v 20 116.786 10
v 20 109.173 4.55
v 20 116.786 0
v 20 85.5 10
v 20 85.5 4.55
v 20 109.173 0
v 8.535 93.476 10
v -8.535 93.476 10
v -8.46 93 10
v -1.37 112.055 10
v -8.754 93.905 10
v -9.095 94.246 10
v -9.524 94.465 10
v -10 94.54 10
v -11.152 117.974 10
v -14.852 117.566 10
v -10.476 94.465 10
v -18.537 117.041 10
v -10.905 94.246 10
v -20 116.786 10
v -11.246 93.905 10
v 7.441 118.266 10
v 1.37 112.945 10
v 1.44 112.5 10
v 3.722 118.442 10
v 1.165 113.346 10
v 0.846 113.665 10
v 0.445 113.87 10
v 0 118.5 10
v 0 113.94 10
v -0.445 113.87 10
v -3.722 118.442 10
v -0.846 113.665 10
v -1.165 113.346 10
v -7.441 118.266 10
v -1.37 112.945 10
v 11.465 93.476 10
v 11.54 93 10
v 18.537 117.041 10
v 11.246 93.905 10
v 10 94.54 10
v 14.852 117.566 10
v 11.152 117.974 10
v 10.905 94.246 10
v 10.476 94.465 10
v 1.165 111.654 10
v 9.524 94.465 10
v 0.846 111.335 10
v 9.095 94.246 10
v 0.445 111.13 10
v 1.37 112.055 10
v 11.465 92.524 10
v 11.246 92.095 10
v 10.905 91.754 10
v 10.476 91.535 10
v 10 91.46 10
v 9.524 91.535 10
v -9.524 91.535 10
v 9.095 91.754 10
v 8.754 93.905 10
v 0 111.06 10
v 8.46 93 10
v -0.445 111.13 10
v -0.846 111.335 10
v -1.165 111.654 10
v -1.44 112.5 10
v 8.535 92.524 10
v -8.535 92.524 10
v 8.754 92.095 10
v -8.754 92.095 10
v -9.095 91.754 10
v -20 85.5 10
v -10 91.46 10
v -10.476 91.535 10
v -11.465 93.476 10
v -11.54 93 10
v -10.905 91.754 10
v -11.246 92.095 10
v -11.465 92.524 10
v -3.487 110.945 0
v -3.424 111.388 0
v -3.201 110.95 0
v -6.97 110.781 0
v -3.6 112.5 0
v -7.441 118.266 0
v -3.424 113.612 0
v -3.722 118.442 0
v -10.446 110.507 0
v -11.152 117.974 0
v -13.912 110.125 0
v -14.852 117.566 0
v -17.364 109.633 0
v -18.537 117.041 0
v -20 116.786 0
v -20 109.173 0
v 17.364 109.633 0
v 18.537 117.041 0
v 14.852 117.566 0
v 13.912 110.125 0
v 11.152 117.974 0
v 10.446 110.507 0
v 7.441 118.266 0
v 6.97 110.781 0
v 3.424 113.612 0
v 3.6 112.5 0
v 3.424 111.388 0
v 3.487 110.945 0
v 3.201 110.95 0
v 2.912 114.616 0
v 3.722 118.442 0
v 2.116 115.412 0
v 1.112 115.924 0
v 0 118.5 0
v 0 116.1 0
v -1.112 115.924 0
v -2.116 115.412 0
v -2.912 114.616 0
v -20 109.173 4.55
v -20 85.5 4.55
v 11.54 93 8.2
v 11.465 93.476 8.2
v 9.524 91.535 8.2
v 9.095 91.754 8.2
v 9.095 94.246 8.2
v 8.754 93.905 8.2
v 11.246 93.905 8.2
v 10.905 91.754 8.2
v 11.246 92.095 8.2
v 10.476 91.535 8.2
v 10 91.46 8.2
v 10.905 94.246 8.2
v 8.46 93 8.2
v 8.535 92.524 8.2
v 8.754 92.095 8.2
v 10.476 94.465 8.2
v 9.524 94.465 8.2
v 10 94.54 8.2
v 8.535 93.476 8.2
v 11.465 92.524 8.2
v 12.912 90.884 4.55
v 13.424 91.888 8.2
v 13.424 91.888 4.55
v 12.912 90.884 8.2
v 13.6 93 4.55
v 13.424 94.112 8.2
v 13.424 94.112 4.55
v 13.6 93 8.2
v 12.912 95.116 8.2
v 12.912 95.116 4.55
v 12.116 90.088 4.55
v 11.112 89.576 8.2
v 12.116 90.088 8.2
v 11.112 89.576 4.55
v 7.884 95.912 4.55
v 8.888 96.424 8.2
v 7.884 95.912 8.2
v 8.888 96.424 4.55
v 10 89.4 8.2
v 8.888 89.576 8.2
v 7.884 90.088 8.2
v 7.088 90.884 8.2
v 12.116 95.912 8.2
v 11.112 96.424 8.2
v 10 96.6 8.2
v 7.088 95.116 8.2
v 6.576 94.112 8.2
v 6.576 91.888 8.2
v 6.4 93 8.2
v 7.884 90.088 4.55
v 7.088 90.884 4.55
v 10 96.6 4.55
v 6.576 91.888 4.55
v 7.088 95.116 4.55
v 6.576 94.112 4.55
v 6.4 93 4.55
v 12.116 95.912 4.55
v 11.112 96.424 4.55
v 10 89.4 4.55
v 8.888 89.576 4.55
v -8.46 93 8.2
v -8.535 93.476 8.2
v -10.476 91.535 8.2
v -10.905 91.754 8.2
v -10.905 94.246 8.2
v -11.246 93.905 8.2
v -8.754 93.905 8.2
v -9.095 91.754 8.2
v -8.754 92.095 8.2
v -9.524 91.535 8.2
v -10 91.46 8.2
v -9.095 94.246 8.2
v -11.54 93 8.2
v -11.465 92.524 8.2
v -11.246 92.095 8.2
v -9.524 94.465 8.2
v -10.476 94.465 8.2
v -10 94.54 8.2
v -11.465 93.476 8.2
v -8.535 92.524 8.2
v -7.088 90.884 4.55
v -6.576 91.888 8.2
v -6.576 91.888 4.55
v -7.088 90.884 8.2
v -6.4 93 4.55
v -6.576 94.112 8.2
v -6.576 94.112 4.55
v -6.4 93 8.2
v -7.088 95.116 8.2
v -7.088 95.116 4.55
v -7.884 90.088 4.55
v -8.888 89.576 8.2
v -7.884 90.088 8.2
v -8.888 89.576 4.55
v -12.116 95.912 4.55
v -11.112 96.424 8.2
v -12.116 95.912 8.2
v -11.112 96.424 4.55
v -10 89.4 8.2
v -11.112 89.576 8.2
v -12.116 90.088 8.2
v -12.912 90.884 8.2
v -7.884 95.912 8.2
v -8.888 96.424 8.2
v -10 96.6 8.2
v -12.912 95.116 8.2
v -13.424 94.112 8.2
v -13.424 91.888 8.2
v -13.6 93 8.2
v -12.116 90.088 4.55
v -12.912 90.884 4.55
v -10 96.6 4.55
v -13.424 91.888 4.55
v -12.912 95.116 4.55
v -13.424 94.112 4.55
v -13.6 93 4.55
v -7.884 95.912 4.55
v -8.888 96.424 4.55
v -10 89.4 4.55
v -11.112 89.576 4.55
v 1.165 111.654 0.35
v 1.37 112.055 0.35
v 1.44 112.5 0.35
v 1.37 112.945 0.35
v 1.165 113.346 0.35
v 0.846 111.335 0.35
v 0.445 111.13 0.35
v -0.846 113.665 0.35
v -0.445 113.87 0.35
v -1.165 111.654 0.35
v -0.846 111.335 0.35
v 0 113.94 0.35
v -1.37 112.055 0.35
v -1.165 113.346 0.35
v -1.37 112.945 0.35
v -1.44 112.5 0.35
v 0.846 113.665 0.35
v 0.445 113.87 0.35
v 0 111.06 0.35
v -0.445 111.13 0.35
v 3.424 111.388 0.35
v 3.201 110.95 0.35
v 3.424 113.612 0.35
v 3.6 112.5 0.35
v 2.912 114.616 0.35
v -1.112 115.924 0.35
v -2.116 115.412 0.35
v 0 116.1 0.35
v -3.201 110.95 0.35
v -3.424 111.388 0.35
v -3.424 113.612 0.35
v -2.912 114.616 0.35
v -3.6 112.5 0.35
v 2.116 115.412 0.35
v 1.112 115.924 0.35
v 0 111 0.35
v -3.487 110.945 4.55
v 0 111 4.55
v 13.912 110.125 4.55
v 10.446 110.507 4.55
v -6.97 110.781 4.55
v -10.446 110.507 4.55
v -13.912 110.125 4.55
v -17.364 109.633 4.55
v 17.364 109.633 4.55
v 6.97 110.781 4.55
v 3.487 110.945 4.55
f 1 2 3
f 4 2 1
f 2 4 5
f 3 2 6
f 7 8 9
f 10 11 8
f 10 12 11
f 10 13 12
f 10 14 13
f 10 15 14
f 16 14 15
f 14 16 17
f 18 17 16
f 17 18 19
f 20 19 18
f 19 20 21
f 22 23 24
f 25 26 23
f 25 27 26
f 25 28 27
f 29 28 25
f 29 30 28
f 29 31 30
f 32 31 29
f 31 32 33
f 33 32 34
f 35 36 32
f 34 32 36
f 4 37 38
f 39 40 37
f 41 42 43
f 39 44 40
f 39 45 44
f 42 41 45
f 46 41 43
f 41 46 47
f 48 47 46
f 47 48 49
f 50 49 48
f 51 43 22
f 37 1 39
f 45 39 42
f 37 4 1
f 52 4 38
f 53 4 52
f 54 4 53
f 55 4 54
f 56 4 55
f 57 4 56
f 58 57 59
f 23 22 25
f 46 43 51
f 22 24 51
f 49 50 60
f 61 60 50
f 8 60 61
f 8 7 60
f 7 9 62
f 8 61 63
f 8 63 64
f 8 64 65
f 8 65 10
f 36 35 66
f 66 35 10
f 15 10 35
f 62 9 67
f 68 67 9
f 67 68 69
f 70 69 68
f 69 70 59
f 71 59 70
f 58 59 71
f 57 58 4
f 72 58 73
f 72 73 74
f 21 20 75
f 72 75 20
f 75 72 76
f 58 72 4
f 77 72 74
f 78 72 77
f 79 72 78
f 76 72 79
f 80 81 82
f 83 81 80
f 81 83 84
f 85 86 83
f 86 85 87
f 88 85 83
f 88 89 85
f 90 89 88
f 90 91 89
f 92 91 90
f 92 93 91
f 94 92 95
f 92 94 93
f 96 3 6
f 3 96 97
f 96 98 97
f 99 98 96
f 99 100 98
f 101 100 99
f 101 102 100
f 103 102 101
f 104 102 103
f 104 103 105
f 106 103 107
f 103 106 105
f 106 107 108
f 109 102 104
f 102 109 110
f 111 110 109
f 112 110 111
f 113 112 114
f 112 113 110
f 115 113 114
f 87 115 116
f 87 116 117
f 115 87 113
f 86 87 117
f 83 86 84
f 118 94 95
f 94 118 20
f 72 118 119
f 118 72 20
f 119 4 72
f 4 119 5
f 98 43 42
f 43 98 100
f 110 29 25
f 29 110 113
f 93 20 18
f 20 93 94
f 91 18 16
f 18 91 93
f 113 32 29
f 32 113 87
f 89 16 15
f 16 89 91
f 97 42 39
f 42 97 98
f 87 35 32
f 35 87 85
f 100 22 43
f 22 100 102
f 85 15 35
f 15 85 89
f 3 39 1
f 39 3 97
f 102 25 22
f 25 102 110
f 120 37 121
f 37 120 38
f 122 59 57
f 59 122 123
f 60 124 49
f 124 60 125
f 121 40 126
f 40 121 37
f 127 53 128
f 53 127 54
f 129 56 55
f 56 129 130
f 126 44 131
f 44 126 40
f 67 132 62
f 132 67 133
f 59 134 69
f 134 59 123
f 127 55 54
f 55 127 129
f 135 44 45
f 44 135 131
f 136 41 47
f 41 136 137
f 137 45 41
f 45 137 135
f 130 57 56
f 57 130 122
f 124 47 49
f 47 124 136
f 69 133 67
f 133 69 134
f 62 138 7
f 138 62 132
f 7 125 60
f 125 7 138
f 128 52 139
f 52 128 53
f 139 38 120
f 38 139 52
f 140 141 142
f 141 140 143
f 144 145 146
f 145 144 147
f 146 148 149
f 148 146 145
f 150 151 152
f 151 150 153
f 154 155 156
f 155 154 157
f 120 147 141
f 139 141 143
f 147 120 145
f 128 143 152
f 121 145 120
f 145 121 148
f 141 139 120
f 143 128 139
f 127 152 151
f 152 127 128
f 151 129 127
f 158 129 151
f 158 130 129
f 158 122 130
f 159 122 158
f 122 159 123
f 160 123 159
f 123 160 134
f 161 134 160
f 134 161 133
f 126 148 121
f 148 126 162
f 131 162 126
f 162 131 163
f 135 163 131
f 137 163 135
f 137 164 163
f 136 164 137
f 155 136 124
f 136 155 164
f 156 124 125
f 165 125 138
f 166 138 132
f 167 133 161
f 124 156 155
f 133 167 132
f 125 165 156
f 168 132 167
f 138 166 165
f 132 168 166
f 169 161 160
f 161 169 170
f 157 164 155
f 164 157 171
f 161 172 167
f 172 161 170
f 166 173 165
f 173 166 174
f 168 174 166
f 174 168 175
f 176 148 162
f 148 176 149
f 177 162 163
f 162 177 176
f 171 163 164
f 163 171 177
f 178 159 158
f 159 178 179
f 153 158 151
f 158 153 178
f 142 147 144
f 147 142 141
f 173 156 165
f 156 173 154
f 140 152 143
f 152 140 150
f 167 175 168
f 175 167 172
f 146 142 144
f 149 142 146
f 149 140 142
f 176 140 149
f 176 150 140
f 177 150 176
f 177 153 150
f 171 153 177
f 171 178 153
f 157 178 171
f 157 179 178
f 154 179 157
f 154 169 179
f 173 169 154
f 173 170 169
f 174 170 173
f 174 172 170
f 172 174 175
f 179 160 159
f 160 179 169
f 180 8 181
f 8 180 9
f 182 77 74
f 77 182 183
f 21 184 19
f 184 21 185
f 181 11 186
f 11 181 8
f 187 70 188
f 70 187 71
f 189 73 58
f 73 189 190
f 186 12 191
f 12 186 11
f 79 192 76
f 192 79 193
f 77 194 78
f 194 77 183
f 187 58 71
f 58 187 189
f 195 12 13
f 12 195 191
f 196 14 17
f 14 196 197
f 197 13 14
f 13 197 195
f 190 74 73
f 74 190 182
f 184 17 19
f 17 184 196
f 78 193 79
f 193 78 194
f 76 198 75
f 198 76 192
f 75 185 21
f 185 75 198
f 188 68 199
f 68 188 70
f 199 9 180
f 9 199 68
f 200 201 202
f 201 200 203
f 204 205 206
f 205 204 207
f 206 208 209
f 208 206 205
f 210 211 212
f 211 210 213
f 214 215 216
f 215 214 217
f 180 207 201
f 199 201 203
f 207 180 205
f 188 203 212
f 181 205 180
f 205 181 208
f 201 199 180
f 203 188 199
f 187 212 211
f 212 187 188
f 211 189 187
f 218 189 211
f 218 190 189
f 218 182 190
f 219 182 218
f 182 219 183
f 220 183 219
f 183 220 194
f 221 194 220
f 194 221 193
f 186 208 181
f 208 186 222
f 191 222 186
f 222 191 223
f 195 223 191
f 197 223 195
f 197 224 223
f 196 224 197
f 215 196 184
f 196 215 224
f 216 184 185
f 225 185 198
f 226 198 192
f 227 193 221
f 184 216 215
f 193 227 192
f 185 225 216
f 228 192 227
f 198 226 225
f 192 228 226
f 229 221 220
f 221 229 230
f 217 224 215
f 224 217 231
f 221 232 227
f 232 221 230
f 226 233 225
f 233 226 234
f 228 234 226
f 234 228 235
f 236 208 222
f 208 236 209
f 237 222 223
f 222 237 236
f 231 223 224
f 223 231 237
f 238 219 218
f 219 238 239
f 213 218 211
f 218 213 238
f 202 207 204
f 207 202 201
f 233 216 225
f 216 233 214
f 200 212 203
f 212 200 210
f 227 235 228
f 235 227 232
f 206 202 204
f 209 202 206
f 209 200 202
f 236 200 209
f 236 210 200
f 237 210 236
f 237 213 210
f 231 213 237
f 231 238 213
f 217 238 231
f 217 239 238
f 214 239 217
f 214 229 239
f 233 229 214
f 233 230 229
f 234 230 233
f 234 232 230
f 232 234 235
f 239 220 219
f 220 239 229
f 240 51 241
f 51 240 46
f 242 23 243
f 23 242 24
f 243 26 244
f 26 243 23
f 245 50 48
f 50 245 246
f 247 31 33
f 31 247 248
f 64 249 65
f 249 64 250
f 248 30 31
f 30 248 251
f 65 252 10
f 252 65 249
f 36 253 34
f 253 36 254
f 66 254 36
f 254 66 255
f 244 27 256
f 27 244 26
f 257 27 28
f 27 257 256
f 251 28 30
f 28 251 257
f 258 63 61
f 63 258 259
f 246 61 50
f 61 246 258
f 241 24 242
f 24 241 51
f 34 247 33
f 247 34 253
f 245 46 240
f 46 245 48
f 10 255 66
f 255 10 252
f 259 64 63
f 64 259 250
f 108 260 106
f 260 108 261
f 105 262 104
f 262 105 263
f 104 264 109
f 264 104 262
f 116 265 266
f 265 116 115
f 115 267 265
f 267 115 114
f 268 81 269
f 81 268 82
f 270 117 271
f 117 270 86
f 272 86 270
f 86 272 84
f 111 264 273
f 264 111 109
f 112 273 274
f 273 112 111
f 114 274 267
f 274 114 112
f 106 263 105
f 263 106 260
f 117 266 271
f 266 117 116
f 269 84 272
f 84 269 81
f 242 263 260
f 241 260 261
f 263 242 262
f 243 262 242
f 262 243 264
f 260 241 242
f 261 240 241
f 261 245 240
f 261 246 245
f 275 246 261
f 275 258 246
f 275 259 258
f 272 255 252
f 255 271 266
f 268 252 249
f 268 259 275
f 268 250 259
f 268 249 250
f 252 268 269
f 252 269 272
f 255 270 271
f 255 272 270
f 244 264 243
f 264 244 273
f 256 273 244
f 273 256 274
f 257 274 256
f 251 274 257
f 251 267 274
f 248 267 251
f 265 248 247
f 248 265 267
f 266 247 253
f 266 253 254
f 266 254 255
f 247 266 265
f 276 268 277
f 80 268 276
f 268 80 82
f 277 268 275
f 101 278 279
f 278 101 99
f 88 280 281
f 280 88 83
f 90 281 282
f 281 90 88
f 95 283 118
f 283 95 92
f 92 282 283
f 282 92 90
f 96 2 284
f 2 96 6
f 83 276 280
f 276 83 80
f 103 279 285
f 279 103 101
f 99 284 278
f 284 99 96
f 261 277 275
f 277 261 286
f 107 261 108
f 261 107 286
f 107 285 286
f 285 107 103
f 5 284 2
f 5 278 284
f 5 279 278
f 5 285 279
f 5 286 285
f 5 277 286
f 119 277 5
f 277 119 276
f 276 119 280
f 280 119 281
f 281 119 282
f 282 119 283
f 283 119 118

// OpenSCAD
// file: configuration.scad
// Increase this if your slicer or printer make holes too tight.
extra_radius = 0.1;

// OD = outside diameter, corner to corner.
m3_nut_od = 6.1;
m3_nut_radius = m3_nut_od/2 + 0.2 + extra_radius;
m3_washer_radius = 3.5 + extra_radius;
m3_washer_height = 0.65;

// Major diameter of metric 3mm thread.
m3_head_height = 3;
m3_major = 2.88;
m3_radius = m3_major/2 + extra_radius;
m3_wide_radius = m3_major/2 + extra_radius + 0.2;

// NEMA17 stepper motors.
motor_shaft_diameter = 5;
motor_shaft_radius = motor_shaft_diameter/2 + extra_radius;

// Frame brackets. M3x8mm screws work best with 3.6 mm brackets.
thickness = 3.6;

// OpenBeam or Misumi. Currently only 15x15 mm, but there is a plan
// to make models more parametric and allow 20x20 mm in the future.
extrusion = 15;

// Placement for the NEMA17 stepper motors.
motor_offset = 44;
motor_length = 47;
// main file
include <configuration.scad>;

mount_height = 10.0;
lip_thickness = 15.0;
extrusion_triangle_ext = 56.0;
expansion_gap = 1.0;

module M3Screw()
{
	union()
	{
		// Main shaft
		translate([0, 0, m3_head_height])
		cylinder(r=m3_radius, h=mount_height+1, $fn=20);
		// Head
		cylinder(r=m3_washer_radius, h=m3_head_height+m3_washer_height, $fn=20);
	}
}

module M3ExactScrew()
{
	union()
	{
		// Main shaft
		translate([0, 0, m3_head_height])
		cylinder(r=m3_radius - extra_radius, h=mount_height+1, $fn=20);
		// Head
		cylinder(r=m3_washer_radius, h=m3_head_height+m3_washer_height, $fn=20);
	}
}

module BuildSurfaceMount(
	build_surface_radius = 110,
	build_surface_height = 3.25,
	pad_height = 2.3,
	width = 40,
	height = 10,
	extrusion_width = 15,
	extrusion_length = 240)
{
	//build_center = sqrt((pow(extrusion_length + extrusion_triangle_ext*2,2) - pow((extrusion_length+extrusion_triangle_ext*2)/2,2)))/2;
	build_center = 93;
echo(build_center);

	difference()
	{
		union()
		{
			intersection()
			{
				// Main mount block
				translate([-width/2, build_center-extrusion_width/2, 0])
					cube([width, build_surface_radius-build_center+extrusion_width/2 + lip_thickness, height]);
				// Outer Radius
				cylinder(r=build_surface_radius+lip_thickness/2+expansion_gap, h=mount_height, $fn=200);
			}
		}
		
		// Build surface
		translate([0,0,-1])
		#cylinder(r=build_surface_radius+expansion_gap, h=build_surface_height+pad_height, $fn=200);

		// Extrusion mount screw holes
		translate([10, build_center, (build_surface_height+pad_height-1) ])
		M3Screw();
		translate([-10, build_center, (build_surface_height+pad_height-1) ])
		M3Screw();

		// Glass hold-down screw
		translate([0, build_surface_radius+2.5, thickness - build_surface_height-m3_head_height-m3_washer_height ])
		M3ExactScrew();
	}
}

//M3Screw();
BuildSurfaceMount();
